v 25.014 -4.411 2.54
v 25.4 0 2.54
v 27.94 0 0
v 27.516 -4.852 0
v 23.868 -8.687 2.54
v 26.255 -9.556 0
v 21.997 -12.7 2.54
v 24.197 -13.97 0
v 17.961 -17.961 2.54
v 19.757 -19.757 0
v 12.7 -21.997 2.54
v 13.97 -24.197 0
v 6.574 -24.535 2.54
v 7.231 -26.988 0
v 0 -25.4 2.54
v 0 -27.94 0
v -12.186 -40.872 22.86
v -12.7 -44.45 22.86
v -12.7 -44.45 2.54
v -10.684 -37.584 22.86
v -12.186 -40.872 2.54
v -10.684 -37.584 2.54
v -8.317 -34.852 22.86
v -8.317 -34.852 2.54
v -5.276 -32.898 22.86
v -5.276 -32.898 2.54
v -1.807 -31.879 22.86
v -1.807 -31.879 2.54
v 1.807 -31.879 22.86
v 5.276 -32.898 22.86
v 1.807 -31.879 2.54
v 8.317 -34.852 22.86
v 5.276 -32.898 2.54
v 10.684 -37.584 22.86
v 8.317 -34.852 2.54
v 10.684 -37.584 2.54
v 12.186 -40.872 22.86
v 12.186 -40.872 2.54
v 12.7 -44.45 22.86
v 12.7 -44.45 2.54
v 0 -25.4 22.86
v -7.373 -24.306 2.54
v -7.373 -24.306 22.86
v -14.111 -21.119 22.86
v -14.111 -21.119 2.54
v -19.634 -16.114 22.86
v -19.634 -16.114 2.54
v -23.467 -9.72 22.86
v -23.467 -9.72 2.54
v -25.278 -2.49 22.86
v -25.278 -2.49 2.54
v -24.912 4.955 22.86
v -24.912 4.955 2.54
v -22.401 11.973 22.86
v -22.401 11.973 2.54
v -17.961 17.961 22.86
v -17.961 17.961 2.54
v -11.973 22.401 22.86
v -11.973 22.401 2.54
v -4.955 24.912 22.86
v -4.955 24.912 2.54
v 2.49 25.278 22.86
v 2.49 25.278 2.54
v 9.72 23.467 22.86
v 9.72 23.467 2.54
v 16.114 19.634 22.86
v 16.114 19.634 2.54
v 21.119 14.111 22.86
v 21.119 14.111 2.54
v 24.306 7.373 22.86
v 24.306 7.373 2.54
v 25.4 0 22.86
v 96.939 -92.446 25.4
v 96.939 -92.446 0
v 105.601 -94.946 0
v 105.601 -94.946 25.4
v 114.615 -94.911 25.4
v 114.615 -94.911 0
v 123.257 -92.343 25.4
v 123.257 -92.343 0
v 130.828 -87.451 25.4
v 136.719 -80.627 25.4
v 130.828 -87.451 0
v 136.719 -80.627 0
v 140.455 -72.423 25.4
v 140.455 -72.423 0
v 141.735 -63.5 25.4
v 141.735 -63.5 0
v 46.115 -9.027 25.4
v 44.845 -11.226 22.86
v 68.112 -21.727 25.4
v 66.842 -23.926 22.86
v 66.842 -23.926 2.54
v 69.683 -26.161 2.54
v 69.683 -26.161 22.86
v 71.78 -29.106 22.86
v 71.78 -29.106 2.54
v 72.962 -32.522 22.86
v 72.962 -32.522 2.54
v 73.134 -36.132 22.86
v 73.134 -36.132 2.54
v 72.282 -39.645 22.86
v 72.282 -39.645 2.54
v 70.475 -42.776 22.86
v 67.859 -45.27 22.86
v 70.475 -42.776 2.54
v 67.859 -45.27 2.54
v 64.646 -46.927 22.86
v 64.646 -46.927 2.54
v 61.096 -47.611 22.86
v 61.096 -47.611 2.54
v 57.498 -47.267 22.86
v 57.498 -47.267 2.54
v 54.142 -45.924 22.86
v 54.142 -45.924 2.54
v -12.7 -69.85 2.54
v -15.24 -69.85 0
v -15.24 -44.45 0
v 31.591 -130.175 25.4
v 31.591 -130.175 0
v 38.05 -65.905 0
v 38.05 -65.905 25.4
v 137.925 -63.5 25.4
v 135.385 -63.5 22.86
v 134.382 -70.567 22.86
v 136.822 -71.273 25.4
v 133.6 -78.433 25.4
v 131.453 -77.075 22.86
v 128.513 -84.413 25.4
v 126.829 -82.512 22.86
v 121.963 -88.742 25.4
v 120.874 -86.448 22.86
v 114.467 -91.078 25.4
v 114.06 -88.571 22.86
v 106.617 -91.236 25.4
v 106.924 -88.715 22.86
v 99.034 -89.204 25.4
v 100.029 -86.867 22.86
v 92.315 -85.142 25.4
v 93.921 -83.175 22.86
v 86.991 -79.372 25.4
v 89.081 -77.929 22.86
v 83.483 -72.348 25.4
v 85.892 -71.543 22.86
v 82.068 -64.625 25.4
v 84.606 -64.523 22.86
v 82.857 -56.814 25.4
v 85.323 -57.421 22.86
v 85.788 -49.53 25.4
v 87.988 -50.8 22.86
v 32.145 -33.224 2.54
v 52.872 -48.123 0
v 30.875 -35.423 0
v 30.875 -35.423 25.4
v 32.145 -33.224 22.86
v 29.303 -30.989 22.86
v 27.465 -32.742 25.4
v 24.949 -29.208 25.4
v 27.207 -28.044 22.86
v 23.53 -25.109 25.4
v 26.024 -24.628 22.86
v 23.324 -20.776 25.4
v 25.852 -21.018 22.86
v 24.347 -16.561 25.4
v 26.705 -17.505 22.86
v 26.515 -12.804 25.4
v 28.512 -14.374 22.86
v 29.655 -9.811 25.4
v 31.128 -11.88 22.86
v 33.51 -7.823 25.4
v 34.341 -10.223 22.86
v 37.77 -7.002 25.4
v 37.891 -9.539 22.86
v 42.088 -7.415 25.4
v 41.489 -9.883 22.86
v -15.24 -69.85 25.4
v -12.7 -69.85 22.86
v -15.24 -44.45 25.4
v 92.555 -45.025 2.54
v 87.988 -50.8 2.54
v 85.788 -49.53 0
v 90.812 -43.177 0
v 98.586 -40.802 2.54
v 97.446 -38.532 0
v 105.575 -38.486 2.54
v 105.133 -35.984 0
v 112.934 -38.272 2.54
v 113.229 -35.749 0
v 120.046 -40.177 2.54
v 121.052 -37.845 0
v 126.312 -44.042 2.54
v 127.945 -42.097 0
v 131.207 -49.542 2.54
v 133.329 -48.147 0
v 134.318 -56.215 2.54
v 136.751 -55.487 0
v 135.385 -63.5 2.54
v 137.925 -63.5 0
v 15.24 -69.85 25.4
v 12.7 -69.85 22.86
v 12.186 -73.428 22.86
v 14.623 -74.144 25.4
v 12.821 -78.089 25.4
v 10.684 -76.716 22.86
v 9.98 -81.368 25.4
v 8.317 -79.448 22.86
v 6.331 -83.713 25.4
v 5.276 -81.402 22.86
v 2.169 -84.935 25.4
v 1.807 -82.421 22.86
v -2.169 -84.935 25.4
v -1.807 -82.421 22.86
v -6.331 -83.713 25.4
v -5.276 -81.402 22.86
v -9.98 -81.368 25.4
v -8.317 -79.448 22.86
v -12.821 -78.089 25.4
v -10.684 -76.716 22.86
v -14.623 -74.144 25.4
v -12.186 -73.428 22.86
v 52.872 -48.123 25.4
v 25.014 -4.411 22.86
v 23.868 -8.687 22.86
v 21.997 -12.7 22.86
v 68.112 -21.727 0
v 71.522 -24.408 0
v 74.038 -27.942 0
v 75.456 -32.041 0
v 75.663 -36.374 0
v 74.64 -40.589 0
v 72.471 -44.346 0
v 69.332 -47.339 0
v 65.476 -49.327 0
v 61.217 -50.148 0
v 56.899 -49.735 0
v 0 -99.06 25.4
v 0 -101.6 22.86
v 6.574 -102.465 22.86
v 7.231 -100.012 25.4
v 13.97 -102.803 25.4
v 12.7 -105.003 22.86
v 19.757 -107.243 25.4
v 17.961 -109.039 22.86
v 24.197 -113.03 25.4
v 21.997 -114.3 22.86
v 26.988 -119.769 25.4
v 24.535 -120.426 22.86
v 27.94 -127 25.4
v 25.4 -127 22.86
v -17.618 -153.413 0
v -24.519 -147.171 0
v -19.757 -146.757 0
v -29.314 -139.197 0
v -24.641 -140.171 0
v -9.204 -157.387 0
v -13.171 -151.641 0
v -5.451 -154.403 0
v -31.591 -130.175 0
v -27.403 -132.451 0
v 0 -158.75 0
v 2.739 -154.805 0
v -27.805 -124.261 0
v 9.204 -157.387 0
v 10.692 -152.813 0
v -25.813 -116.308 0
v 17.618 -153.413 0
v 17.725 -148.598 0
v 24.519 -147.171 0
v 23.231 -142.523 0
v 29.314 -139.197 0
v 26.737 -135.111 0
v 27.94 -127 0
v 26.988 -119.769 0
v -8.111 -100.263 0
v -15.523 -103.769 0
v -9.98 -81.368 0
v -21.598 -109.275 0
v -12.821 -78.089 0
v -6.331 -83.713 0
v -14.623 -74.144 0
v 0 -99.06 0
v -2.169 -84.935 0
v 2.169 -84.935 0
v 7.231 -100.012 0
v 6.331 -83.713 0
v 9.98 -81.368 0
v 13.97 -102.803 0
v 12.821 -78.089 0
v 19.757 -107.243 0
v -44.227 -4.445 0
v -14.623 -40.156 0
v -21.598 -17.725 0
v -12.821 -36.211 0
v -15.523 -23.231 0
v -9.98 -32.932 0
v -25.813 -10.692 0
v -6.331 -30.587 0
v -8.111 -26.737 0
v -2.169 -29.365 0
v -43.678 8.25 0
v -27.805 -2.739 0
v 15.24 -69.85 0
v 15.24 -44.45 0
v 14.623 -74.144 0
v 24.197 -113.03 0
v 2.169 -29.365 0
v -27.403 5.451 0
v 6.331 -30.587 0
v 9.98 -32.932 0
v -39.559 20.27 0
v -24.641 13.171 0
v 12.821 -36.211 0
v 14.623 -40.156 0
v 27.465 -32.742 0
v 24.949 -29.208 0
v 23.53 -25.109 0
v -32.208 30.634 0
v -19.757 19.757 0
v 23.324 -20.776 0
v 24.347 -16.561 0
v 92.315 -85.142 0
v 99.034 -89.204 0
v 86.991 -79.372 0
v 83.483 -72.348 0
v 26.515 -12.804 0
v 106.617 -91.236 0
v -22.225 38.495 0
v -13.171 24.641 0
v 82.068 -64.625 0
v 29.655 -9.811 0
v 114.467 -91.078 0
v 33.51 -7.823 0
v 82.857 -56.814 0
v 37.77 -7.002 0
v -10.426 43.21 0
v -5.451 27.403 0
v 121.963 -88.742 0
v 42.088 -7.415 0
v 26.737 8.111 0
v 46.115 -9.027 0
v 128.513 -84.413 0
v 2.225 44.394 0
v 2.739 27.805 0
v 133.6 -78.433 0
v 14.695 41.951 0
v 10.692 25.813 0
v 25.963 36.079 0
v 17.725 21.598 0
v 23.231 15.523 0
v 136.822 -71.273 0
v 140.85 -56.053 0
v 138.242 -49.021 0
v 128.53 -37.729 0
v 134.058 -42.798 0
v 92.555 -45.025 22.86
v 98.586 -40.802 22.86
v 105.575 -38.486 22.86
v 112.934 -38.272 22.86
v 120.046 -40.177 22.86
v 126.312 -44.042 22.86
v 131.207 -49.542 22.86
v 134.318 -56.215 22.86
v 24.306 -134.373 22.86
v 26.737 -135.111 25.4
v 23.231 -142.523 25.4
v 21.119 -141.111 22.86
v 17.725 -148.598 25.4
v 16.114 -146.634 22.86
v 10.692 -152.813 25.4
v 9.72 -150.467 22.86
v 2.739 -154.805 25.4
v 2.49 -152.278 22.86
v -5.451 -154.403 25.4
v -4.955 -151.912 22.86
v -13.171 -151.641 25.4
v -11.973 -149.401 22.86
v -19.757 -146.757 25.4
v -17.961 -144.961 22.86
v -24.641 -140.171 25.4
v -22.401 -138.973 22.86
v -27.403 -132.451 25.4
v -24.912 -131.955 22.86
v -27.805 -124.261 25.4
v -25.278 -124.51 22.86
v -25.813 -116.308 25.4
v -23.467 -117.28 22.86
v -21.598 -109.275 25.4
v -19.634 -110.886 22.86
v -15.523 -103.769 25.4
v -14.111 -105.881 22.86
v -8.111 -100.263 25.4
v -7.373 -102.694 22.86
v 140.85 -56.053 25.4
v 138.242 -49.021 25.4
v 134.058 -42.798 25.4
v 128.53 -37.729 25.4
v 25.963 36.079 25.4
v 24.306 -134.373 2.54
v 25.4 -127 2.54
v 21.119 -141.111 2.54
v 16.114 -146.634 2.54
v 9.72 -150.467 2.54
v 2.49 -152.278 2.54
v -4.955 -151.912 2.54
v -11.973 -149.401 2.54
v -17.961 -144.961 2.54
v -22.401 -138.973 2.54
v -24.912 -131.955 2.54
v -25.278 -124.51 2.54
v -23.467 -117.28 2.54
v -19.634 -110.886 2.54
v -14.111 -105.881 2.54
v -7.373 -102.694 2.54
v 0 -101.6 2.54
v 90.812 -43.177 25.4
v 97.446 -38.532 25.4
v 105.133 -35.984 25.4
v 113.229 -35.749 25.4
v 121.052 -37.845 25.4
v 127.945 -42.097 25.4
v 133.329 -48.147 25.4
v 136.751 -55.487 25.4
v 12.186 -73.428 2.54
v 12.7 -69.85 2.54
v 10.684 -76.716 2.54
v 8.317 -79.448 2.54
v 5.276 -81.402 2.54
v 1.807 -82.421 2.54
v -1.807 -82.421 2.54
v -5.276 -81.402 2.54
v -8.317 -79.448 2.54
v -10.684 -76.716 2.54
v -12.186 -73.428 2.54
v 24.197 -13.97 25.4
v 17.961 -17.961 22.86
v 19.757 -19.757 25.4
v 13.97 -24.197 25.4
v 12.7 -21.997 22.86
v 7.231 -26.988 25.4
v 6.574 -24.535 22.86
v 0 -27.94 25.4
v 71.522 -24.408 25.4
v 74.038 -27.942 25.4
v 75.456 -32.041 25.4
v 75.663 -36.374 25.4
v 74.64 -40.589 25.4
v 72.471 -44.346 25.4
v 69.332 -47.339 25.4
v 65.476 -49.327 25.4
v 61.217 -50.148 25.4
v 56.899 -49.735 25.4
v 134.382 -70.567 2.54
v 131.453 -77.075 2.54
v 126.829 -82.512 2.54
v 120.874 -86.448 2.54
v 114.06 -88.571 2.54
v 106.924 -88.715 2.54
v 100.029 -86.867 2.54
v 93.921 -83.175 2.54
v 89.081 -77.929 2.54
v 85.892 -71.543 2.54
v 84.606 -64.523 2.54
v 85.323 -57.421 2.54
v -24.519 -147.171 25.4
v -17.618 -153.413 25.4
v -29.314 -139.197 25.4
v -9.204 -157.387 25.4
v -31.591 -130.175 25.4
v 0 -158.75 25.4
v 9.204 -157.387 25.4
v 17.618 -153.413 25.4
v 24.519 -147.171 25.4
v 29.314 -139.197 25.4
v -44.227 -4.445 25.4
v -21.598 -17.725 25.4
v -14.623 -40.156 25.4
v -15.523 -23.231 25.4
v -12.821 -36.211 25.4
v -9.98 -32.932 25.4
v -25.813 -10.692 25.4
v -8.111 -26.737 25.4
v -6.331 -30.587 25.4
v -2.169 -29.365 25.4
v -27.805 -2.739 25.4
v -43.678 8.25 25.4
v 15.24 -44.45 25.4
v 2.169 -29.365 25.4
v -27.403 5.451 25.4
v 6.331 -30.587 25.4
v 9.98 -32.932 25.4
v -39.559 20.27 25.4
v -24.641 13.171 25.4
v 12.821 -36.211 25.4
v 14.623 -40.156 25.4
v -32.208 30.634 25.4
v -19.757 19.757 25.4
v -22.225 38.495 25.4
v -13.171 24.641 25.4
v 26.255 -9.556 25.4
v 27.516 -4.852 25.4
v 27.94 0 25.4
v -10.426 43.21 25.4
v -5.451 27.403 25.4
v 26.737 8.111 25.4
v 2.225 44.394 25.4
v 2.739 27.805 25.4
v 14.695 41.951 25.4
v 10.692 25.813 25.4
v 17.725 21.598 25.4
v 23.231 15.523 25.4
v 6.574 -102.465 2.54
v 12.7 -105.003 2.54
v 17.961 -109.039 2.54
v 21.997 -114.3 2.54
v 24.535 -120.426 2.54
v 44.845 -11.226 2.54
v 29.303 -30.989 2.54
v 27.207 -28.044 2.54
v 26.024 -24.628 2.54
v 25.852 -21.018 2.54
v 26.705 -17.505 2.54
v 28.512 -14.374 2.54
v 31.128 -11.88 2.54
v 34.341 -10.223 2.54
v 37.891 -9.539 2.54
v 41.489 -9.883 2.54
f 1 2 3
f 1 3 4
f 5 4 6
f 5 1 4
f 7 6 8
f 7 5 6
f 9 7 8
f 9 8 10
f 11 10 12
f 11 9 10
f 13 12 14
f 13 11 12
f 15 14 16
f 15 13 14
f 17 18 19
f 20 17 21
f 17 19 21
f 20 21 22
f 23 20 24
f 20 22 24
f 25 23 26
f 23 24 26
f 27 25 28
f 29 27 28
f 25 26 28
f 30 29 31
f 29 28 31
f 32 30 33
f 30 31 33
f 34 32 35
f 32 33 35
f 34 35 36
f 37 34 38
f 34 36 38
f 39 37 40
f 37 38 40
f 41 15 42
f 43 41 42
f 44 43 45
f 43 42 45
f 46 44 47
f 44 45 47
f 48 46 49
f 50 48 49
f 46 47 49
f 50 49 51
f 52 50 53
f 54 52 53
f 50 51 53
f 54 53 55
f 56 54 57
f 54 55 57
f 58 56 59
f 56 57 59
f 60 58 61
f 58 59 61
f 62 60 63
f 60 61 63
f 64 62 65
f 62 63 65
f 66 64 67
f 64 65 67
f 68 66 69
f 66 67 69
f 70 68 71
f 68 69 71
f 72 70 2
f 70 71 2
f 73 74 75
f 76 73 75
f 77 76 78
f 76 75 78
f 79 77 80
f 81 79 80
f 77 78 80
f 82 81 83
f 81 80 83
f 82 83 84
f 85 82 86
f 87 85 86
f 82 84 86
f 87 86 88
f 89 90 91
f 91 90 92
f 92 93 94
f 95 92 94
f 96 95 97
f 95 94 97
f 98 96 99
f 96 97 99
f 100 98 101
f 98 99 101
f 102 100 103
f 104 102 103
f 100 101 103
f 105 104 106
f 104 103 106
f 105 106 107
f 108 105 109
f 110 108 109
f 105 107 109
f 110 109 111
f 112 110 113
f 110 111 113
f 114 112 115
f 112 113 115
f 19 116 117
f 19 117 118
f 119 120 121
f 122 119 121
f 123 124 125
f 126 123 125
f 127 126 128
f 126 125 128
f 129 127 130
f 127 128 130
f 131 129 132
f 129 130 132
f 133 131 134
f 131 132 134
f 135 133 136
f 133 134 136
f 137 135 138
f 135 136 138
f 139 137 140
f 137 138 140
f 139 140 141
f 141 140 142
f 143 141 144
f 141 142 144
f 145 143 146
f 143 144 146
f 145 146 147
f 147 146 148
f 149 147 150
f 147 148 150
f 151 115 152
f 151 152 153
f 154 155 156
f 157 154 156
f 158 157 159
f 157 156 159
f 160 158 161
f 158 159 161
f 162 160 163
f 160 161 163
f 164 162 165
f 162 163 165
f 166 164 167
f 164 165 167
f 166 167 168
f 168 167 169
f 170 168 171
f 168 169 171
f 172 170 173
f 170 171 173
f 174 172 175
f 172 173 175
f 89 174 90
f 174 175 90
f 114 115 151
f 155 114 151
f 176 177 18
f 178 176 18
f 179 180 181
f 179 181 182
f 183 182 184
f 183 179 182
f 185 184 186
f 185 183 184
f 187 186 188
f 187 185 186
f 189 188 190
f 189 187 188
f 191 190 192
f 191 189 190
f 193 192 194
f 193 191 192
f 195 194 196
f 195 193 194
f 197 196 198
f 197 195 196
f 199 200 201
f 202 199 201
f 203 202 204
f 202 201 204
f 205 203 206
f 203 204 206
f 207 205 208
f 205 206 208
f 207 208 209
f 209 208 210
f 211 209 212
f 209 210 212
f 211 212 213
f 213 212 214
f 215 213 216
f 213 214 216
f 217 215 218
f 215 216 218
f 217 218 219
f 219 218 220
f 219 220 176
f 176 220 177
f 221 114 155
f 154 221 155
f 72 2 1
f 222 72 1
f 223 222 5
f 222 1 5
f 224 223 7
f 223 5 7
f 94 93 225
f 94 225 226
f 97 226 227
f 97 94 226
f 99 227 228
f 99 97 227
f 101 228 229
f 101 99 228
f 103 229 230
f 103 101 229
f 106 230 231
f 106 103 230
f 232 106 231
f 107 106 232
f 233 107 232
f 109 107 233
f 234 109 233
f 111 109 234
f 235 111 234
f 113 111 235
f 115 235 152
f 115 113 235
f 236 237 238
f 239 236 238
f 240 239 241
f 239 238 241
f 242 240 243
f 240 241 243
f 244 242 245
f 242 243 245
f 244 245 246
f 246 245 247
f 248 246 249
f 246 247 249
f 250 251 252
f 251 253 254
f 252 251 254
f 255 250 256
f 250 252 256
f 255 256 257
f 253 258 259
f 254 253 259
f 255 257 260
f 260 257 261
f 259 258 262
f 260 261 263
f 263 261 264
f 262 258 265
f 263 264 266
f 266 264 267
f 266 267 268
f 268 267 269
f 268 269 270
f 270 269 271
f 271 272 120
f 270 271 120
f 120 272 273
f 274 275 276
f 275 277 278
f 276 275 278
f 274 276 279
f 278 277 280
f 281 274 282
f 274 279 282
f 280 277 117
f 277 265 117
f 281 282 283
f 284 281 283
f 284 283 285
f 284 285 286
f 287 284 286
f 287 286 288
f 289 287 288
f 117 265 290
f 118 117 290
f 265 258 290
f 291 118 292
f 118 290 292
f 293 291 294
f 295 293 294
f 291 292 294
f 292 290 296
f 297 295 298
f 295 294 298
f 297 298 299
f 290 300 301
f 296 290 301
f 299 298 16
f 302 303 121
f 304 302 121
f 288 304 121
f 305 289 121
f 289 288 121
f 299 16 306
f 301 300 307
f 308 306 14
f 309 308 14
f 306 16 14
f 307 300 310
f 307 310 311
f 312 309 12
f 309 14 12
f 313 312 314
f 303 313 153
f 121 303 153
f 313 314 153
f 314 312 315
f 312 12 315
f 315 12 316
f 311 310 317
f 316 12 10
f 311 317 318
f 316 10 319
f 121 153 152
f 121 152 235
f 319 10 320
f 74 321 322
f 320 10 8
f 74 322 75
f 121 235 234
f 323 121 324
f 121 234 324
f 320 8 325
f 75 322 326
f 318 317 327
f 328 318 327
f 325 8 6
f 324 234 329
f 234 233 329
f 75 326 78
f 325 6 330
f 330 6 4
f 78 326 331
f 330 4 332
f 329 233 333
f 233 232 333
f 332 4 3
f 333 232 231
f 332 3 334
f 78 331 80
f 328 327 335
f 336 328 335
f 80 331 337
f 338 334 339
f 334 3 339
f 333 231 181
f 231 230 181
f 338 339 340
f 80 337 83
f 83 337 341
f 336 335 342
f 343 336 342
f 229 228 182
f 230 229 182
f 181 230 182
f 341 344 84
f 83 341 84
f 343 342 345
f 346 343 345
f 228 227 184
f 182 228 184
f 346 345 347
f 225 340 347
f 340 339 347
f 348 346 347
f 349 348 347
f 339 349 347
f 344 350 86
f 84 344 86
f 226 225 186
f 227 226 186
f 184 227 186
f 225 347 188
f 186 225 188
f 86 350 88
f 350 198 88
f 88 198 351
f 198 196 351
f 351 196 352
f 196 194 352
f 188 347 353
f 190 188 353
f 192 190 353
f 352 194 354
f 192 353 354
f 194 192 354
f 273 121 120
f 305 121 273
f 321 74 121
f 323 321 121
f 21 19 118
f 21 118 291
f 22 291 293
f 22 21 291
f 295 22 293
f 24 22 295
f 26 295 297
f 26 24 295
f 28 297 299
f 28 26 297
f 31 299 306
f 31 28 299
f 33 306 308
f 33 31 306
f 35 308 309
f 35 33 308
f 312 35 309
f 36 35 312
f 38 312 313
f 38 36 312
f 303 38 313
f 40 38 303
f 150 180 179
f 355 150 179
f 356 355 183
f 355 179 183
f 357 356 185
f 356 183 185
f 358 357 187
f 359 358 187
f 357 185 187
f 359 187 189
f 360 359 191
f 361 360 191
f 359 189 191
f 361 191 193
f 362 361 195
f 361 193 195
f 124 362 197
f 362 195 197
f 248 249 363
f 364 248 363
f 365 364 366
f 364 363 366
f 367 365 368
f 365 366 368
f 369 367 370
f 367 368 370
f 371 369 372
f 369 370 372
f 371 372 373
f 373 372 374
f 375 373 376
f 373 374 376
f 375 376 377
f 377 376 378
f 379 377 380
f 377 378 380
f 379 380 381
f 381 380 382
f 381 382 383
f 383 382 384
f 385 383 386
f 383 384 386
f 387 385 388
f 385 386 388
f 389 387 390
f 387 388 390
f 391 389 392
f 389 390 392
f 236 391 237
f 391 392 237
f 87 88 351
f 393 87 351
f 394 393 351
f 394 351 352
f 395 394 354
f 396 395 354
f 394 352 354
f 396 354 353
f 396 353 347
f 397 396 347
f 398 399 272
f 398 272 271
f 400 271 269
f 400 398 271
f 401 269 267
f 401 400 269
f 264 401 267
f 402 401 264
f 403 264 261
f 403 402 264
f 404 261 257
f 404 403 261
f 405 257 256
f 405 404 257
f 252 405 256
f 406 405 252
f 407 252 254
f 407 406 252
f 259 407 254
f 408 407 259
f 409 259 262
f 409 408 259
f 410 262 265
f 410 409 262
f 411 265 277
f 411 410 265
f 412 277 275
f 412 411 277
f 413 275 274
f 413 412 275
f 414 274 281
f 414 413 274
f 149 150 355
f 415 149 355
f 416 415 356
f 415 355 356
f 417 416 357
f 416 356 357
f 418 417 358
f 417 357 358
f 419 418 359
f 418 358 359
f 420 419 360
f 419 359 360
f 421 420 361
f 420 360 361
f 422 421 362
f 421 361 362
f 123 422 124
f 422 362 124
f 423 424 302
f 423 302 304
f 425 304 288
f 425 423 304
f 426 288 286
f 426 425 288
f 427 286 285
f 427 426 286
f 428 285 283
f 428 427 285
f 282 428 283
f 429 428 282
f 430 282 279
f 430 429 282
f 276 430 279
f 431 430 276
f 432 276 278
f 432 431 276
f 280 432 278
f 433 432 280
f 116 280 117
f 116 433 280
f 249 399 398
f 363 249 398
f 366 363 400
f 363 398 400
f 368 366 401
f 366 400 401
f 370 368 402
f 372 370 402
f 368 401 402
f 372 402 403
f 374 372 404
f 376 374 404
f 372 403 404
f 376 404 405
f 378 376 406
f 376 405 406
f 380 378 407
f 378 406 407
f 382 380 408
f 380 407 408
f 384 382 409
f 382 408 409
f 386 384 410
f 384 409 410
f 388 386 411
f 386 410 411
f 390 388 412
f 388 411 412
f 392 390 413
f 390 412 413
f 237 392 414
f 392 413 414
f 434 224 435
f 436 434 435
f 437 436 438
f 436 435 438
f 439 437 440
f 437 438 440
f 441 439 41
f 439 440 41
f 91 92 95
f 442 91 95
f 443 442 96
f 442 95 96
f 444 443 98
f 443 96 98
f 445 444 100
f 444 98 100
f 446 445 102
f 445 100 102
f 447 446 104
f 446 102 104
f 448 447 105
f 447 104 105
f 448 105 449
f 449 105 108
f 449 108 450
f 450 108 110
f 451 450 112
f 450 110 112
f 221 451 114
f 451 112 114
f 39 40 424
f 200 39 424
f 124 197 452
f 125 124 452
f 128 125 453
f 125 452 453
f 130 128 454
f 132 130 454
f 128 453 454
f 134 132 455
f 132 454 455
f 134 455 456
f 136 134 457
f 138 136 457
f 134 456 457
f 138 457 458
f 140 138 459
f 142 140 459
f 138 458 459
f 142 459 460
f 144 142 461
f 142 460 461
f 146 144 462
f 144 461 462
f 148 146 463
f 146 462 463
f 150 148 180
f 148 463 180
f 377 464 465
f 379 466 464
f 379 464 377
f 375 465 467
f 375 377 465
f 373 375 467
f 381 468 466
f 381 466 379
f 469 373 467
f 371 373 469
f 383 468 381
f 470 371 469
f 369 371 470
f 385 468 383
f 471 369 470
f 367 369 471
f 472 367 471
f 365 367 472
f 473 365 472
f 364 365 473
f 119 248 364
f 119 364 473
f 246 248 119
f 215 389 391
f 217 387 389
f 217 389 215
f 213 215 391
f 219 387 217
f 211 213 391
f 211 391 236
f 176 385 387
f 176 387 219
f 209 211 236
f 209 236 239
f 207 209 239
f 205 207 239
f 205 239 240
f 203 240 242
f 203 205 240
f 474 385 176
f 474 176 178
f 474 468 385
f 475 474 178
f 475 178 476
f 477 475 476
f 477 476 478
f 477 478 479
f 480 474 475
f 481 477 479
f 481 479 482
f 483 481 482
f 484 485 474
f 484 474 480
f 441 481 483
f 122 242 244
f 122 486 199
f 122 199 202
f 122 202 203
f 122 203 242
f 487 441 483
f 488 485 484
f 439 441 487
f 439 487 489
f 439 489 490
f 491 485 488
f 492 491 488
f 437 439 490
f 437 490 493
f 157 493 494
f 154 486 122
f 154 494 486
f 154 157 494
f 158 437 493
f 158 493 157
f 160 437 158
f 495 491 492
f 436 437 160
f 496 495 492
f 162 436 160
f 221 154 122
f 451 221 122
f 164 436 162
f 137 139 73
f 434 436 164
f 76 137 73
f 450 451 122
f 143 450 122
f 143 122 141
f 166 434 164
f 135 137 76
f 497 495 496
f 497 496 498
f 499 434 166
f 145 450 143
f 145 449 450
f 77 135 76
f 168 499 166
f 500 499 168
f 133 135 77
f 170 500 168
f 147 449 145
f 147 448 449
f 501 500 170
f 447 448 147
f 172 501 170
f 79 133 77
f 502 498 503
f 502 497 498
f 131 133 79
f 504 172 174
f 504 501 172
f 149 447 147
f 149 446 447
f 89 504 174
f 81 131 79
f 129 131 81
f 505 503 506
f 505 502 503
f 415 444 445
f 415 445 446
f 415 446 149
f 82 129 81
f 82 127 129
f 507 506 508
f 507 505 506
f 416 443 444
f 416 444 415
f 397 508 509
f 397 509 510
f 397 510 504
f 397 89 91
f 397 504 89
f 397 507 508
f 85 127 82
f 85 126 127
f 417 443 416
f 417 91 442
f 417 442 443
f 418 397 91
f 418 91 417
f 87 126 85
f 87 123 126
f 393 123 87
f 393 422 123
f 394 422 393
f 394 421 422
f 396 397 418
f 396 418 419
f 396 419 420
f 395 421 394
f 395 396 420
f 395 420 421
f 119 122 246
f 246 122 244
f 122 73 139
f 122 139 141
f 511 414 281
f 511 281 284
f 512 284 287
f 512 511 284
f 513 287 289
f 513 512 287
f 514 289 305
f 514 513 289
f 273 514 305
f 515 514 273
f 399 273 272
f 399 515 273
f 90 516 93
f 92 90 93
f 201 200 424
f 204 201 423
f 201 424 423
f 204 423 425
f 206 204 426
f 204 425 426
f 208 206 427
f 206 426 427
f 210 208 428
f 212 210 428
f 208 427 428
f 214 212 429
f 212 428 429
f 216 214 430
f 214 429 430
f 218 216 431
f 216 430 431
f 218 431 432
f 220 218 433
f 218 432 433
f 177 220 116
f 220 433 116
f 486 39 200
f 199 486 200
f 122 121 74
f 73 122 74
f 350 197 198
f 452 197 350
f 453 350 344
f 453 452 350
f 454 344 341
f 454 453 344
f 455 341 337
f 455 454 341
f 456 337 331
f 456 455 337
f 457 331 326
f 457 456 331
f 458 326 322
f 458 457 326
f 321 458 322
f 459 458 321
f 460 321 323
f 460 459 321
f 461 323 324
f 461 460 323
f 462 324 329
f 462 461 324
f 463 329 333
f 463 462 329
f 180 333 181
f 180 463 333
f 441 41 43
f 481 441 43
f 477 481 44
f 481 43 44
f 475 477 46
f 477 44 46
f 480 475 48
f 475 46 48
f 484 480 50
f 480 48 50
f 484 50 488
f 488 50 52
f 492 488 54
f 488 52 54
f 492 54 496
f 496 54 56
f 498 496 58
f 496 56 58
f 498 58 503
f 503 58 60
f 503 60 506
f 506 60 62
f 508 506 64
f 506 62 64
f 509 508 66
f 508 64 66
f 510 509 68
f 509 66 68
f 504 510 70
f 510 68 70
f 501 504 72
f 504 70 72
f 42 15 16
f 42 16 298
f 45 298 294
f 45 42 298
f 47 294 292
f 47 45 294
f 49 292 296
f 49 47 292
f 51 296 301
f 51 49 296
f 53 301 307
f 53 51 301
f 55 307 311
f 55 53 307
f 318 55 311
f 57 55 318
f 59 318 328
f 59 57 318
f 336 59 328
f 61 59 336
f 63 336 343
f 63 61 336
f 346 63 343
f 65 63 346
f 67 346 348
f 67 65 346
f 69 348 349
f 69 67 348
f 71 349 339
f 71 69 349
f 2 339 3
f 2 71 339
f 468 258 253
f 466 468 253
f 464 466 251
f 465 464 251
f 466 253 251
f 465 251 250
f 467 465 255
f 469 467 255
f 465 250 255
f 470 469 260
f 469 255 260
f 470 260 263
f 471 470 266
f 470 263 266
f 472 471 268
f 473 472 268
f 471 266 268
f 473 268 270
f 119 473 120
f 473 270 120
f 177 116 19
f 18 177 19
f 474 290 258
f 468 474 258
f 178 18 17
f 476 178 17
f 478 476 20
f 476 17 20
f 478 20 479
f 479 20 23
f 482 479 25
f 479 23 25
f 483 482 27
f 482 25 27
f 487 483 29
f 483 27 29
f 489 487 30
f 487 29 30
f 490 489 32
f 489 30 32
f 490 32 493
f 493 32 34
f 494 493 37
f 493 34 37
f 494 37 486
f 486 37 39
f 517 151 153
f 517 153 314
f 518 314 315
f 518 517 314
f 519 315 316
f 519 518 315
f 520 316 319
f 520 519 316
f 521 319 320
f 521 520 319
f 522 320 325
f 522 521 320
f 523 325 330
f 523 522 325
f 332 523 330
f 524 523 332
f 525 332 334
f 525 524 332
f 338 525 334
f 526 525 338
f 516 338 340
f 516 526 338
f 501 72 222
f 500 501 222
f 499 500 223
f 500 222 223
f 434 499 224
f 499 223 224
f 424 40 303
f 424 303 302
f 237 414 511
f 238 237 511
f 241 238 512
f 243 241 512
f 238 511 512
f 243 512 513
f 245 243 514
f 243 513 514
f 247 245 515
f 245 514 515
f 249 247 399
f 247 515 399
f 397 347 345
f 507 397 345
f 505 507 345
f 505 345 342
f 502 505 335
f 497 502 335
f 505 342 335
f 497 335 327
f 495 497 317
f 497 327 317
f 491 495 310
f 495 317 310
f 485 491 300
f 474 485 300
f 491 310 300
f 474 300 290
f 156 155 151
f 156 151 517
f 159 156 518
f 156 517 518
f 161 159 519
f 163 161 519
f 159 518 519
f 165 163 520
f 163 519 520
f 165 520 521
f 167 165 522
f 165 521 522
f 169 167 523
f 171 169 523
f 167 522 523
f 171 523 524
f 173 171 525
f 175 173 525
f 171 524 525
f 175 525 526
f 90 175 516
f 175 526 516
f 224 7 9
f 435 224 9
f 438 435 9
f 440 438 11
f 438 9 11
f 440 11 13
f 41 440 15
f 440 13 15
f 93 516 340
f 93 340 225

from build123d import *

# Parameters (mm, degrees)
F1_DEPTH = 25.4
F3_DEPTH = 25.4
F4_SIZE  = 2.54


with BuildPart() as f1:
    # F0 (on Top) → F1 (new body)
    with BuildSketch(Plane.XY):
        with BuildLine():
            ThreePointArc((0, -95.25), (-23.5464301965, -105.7014525143), (-31.5908511281, -130.175))
            ThreePointArc((-31.5908511281, -130.175), (0, -158.75), (31.5908511281, -130.175))
            ThreePointArc((31.5908511281, -130.175), (31.7101878213, -128.5894931081), (31.75, -127))
            ThreePointArc((31.75, -127), (22.4506403027, -104.5493596973), (0, -95.25))
        make_face()
        with BuildLine():
            ThreePointArc((25.4, -127), (-17.9605122421, -144.9605122421), (0, -101.6))
            ThreePointArc((0, -101.6), (17.9605122421, -109.0394877579), (25.4, -127))
        make_face(mode=Mode.SUBTRACT)
        with BuildLine():
            Line((31.5908511281, -130.175), (38.0502351456, -65.9049405121))
            Line((38.0502351456, -65.9049405121), (0, -48.7559073592))
            Line((0, -48.7559073592), (0, -95.25))
            ThreePointArc((0, -95.25), (22.4506403027, -104.5493596973), (31.75, -127))
            ThreePointArc((31.75, -127), (31.7101878213, -128.5894931081), (31.5908511281, -130.175))
        make_face()
        with BuildLine():
            ThreePointArc((-18.2641128699, -40.5243714458), (-36.0793714458, -25.9630787095), (-44.2271915794, -4.445))
            Line((-44.2271915794, -4.445), (-31.5908511281, -130.175))
            ThreePointArc((-31.5908511281, -130.175), (-23.5464301965, -105.7014525143), (0, -95.25))
            Line((0, -95.25), (0, -48.7559073592))
            Line((0, -48.7559073592), (-18.2641128699, -40.5243714458))
        make_face()
        with BuildLine():
            Line((42.2238543576, -24.3779536796), (38.4948291982, -22.225))
            ThreePointArc((38.4948291982, -22.225), (22.225, -38.4948291982), (0, -44.45))
            Line((0, -44.45), (0, -48.7559073592))
            Line((0, -48.7559073592), (38.0502351456, -65.9049405121))
            Line((38.0502351456, -65.9049405121), (42.2238543576, -24.3779536796))
        make_face()
        with BuildLine():
            ThreePointArc((0, -44.45), (-9.3406153233, -43.4575126461), (-18.2641128699, -40.5243714458))
            Line((-18.2641128699, -40.5243714458), (0, -48.7559073592))
            Line((0, -48.7559073592), (0, -44.45))
        make_face()
        with BuildLine():
            ThreePointArc((0, -44.45), (22.225, -38.4948291982), (38.4948291982, -22.225))
            Line((38.4948291982, -22.225), (21.9970452561, -12.7))
            ThreePointArc((21.9970452561, -12.7), (12.7, -21.9970452561), (0, -25.4))
            Line((0, -25.4), (0, -44.45))
        make_face()
        with BuildLine():
            ThreePointArc((44.2271915794, -4.445), (44.3942629498, -2.2252903514), (44.45, 0))
            ThreePointArc((44.45, 0), (39.5592046725, 20.2699734998), (25.9630787095, 36.0793714458))
            ThreePointArc((25.9630787095, 36.0793714458), (-22.225, 38.4948291982), (-44.2271915794, -4.445))
            ThreePointArc((-44.2271915794, -4.445), (-36.0793714458, -25.9630787095), (-18.2641128699, -40.5243714458))
            ThreePointArc((-18.2641128699, -40.5243714458), (-9.3406153233, -43.4575126461), (0, -44.45))
            Line((0, -44.45), (0, -25.4))
            ThreePointArc((0, -25.4), (-17.9605122421, 17.9605122421), (25.4, 0))
            ThreePointArc((25.4, 0), (24.5345159877, -6.5740037456), (21.9970452561, -12.7))
            Line((21.9970452561, -12.7), (38.4948291982, -22.225))
            ThreePointArc((38.4948291982, -22.225), (42.3056175984, -13.6395461661), (44.2271915794, -4.445))
        make_face()
        with BuildLine():
            Line((42.2238543576, -24.3779536796), (44.2271915794, -4.445))
            ThreePointArc((44.2271915794, -4.445), (42.3056175984, -13.6395461661), (38.4948291982, -22.225))
            Line((38.4948291982, -22.225), (42.2238543576, -24.3779536796))
        make_face()
        with BuildLine():
            Line((82.4889197105, -47.625), (42.2238543576, -24.3779536796))
            Line((42.2238543576, -24.3779536796), (38.0502351456, -65.9049405121))
            Line((38.0502351456, -65.9049405121), (96.9394313736, -92.4459796041))
            ThreePointArc((96.9394313736, -92.4459796041), (79.766927996, -73.2425329758), (82.4889197105, -47.625))
        make_face()
        with BuildLine():
            ThreePointArc((25.9630787095, 36.0793714458), (39.5592046725, 20.2699734998), (44.45, 0))
            ThreePointArc((44.45, 0), (44.3942629498, -2.2252903514), (44.2271915794, -4.445))
            Line((44.2271915794, -4.445), (42.2238543576, -24.3779536796))
            Line((42.2238543576, -24.3779536796), (82.4889197105, -47.625))
            ThreePointArc((82.4889197105, -47.625), (103.3133581926, -32.4589195385), (128.5302825017, -37.7290203959))
            Line((128.5302825017, -37.7290203959), (25.9630787095, 36.0793714458))
        make_face()
        with BuildLine():
            ThreePointArc((141.7352262806, -63.5), (138.2418010467, -49.0214475002), (128.5302825017, -37.7290203959))
            ThreePointArc((128.5302825017, -37.7290203959), (103.3133581926, -32.4589195385), (82.4889197105, -47.625))
            ThreePointArc((82.4889197105, -47.625), (79.766927996, -73.2425329758), (96.9394313736, -92.4459796041))
            ThreePointArc((96.9394313736, -92.4459796041), (127.216861602, -90.1670816579), (141.7352262806, -63.5))
        make_face()
        with BuildLine():
            ThreePointArc((135.3852262806, -63.5), (103.411222535, -88.0345159877), (87.9881810245, -50.8))
            ThreePointArc((87.9881810245, -50.8), (116.5592300262, -38.9654840123), (135.3852262806, -63.5))
        make_face(mode=Mode.SUBTRACT)
    extrude(amount=F1_DEPTH)

    # F2 (on face) → F3 (cut)
    with BuildSketch(Plane(origin=(0, 0, 0), x_dir=(1, 0, 0), z_dir=(0, 0, -1))):
        with BuildLine():
            ThreePointArc((32.1448291982, 33.2235226281), (27.4963065702, 15.875), (44.8448291982, 11.2264773719))
            Line((44.8448291982, 11.2264773719), (66.8418744543, 23.9264773719))
            ThreePointArc((66.8418744543, 23.9264773719), (71.4903970824, 41.275), (54.1418744543, 45.9235226281))
            Line((54.1418744543, 45.9235226281), (32.1448291982, 33.2235226281))
        make_face()
        with BuildLine():
            ThreePointArc((-12.7, 44.45), (0, 31.75), (12.7, 44.45))
            Line((12.7, 44.45), (12.7, 69.85))
            ThreePointArc((12.7, 69.85), (0, 82.55), (-12.7, 69.85))
            Line((-12.7, 69.85), (-12.7, 44.45))
        make_face()
    extrude(amount=-F3_DEPTH, mode=Mode.SUBTRACT)

    # F4
    f4_edges = [f1.edges().sort_by_distance(p)[0] for p in [
        (43.143352, -39.573523, 25.4),
        (131.982272, -76.2, 25.4),
        (-12.7, -57.15, 25.4),
        (-25.4, -127, 25.4),
        (0, 25.4, 25.4),
        (27.496307, -15.875, 0),
        (131.982272, -76.2, 0),
        (0, 25.4, 0),
        (12.7, -57.15, 0),
        (-25.4, -127, 0),
    ]]
    chamfer(f4_edges, length=F4_SIZE)


solid = f1.part
